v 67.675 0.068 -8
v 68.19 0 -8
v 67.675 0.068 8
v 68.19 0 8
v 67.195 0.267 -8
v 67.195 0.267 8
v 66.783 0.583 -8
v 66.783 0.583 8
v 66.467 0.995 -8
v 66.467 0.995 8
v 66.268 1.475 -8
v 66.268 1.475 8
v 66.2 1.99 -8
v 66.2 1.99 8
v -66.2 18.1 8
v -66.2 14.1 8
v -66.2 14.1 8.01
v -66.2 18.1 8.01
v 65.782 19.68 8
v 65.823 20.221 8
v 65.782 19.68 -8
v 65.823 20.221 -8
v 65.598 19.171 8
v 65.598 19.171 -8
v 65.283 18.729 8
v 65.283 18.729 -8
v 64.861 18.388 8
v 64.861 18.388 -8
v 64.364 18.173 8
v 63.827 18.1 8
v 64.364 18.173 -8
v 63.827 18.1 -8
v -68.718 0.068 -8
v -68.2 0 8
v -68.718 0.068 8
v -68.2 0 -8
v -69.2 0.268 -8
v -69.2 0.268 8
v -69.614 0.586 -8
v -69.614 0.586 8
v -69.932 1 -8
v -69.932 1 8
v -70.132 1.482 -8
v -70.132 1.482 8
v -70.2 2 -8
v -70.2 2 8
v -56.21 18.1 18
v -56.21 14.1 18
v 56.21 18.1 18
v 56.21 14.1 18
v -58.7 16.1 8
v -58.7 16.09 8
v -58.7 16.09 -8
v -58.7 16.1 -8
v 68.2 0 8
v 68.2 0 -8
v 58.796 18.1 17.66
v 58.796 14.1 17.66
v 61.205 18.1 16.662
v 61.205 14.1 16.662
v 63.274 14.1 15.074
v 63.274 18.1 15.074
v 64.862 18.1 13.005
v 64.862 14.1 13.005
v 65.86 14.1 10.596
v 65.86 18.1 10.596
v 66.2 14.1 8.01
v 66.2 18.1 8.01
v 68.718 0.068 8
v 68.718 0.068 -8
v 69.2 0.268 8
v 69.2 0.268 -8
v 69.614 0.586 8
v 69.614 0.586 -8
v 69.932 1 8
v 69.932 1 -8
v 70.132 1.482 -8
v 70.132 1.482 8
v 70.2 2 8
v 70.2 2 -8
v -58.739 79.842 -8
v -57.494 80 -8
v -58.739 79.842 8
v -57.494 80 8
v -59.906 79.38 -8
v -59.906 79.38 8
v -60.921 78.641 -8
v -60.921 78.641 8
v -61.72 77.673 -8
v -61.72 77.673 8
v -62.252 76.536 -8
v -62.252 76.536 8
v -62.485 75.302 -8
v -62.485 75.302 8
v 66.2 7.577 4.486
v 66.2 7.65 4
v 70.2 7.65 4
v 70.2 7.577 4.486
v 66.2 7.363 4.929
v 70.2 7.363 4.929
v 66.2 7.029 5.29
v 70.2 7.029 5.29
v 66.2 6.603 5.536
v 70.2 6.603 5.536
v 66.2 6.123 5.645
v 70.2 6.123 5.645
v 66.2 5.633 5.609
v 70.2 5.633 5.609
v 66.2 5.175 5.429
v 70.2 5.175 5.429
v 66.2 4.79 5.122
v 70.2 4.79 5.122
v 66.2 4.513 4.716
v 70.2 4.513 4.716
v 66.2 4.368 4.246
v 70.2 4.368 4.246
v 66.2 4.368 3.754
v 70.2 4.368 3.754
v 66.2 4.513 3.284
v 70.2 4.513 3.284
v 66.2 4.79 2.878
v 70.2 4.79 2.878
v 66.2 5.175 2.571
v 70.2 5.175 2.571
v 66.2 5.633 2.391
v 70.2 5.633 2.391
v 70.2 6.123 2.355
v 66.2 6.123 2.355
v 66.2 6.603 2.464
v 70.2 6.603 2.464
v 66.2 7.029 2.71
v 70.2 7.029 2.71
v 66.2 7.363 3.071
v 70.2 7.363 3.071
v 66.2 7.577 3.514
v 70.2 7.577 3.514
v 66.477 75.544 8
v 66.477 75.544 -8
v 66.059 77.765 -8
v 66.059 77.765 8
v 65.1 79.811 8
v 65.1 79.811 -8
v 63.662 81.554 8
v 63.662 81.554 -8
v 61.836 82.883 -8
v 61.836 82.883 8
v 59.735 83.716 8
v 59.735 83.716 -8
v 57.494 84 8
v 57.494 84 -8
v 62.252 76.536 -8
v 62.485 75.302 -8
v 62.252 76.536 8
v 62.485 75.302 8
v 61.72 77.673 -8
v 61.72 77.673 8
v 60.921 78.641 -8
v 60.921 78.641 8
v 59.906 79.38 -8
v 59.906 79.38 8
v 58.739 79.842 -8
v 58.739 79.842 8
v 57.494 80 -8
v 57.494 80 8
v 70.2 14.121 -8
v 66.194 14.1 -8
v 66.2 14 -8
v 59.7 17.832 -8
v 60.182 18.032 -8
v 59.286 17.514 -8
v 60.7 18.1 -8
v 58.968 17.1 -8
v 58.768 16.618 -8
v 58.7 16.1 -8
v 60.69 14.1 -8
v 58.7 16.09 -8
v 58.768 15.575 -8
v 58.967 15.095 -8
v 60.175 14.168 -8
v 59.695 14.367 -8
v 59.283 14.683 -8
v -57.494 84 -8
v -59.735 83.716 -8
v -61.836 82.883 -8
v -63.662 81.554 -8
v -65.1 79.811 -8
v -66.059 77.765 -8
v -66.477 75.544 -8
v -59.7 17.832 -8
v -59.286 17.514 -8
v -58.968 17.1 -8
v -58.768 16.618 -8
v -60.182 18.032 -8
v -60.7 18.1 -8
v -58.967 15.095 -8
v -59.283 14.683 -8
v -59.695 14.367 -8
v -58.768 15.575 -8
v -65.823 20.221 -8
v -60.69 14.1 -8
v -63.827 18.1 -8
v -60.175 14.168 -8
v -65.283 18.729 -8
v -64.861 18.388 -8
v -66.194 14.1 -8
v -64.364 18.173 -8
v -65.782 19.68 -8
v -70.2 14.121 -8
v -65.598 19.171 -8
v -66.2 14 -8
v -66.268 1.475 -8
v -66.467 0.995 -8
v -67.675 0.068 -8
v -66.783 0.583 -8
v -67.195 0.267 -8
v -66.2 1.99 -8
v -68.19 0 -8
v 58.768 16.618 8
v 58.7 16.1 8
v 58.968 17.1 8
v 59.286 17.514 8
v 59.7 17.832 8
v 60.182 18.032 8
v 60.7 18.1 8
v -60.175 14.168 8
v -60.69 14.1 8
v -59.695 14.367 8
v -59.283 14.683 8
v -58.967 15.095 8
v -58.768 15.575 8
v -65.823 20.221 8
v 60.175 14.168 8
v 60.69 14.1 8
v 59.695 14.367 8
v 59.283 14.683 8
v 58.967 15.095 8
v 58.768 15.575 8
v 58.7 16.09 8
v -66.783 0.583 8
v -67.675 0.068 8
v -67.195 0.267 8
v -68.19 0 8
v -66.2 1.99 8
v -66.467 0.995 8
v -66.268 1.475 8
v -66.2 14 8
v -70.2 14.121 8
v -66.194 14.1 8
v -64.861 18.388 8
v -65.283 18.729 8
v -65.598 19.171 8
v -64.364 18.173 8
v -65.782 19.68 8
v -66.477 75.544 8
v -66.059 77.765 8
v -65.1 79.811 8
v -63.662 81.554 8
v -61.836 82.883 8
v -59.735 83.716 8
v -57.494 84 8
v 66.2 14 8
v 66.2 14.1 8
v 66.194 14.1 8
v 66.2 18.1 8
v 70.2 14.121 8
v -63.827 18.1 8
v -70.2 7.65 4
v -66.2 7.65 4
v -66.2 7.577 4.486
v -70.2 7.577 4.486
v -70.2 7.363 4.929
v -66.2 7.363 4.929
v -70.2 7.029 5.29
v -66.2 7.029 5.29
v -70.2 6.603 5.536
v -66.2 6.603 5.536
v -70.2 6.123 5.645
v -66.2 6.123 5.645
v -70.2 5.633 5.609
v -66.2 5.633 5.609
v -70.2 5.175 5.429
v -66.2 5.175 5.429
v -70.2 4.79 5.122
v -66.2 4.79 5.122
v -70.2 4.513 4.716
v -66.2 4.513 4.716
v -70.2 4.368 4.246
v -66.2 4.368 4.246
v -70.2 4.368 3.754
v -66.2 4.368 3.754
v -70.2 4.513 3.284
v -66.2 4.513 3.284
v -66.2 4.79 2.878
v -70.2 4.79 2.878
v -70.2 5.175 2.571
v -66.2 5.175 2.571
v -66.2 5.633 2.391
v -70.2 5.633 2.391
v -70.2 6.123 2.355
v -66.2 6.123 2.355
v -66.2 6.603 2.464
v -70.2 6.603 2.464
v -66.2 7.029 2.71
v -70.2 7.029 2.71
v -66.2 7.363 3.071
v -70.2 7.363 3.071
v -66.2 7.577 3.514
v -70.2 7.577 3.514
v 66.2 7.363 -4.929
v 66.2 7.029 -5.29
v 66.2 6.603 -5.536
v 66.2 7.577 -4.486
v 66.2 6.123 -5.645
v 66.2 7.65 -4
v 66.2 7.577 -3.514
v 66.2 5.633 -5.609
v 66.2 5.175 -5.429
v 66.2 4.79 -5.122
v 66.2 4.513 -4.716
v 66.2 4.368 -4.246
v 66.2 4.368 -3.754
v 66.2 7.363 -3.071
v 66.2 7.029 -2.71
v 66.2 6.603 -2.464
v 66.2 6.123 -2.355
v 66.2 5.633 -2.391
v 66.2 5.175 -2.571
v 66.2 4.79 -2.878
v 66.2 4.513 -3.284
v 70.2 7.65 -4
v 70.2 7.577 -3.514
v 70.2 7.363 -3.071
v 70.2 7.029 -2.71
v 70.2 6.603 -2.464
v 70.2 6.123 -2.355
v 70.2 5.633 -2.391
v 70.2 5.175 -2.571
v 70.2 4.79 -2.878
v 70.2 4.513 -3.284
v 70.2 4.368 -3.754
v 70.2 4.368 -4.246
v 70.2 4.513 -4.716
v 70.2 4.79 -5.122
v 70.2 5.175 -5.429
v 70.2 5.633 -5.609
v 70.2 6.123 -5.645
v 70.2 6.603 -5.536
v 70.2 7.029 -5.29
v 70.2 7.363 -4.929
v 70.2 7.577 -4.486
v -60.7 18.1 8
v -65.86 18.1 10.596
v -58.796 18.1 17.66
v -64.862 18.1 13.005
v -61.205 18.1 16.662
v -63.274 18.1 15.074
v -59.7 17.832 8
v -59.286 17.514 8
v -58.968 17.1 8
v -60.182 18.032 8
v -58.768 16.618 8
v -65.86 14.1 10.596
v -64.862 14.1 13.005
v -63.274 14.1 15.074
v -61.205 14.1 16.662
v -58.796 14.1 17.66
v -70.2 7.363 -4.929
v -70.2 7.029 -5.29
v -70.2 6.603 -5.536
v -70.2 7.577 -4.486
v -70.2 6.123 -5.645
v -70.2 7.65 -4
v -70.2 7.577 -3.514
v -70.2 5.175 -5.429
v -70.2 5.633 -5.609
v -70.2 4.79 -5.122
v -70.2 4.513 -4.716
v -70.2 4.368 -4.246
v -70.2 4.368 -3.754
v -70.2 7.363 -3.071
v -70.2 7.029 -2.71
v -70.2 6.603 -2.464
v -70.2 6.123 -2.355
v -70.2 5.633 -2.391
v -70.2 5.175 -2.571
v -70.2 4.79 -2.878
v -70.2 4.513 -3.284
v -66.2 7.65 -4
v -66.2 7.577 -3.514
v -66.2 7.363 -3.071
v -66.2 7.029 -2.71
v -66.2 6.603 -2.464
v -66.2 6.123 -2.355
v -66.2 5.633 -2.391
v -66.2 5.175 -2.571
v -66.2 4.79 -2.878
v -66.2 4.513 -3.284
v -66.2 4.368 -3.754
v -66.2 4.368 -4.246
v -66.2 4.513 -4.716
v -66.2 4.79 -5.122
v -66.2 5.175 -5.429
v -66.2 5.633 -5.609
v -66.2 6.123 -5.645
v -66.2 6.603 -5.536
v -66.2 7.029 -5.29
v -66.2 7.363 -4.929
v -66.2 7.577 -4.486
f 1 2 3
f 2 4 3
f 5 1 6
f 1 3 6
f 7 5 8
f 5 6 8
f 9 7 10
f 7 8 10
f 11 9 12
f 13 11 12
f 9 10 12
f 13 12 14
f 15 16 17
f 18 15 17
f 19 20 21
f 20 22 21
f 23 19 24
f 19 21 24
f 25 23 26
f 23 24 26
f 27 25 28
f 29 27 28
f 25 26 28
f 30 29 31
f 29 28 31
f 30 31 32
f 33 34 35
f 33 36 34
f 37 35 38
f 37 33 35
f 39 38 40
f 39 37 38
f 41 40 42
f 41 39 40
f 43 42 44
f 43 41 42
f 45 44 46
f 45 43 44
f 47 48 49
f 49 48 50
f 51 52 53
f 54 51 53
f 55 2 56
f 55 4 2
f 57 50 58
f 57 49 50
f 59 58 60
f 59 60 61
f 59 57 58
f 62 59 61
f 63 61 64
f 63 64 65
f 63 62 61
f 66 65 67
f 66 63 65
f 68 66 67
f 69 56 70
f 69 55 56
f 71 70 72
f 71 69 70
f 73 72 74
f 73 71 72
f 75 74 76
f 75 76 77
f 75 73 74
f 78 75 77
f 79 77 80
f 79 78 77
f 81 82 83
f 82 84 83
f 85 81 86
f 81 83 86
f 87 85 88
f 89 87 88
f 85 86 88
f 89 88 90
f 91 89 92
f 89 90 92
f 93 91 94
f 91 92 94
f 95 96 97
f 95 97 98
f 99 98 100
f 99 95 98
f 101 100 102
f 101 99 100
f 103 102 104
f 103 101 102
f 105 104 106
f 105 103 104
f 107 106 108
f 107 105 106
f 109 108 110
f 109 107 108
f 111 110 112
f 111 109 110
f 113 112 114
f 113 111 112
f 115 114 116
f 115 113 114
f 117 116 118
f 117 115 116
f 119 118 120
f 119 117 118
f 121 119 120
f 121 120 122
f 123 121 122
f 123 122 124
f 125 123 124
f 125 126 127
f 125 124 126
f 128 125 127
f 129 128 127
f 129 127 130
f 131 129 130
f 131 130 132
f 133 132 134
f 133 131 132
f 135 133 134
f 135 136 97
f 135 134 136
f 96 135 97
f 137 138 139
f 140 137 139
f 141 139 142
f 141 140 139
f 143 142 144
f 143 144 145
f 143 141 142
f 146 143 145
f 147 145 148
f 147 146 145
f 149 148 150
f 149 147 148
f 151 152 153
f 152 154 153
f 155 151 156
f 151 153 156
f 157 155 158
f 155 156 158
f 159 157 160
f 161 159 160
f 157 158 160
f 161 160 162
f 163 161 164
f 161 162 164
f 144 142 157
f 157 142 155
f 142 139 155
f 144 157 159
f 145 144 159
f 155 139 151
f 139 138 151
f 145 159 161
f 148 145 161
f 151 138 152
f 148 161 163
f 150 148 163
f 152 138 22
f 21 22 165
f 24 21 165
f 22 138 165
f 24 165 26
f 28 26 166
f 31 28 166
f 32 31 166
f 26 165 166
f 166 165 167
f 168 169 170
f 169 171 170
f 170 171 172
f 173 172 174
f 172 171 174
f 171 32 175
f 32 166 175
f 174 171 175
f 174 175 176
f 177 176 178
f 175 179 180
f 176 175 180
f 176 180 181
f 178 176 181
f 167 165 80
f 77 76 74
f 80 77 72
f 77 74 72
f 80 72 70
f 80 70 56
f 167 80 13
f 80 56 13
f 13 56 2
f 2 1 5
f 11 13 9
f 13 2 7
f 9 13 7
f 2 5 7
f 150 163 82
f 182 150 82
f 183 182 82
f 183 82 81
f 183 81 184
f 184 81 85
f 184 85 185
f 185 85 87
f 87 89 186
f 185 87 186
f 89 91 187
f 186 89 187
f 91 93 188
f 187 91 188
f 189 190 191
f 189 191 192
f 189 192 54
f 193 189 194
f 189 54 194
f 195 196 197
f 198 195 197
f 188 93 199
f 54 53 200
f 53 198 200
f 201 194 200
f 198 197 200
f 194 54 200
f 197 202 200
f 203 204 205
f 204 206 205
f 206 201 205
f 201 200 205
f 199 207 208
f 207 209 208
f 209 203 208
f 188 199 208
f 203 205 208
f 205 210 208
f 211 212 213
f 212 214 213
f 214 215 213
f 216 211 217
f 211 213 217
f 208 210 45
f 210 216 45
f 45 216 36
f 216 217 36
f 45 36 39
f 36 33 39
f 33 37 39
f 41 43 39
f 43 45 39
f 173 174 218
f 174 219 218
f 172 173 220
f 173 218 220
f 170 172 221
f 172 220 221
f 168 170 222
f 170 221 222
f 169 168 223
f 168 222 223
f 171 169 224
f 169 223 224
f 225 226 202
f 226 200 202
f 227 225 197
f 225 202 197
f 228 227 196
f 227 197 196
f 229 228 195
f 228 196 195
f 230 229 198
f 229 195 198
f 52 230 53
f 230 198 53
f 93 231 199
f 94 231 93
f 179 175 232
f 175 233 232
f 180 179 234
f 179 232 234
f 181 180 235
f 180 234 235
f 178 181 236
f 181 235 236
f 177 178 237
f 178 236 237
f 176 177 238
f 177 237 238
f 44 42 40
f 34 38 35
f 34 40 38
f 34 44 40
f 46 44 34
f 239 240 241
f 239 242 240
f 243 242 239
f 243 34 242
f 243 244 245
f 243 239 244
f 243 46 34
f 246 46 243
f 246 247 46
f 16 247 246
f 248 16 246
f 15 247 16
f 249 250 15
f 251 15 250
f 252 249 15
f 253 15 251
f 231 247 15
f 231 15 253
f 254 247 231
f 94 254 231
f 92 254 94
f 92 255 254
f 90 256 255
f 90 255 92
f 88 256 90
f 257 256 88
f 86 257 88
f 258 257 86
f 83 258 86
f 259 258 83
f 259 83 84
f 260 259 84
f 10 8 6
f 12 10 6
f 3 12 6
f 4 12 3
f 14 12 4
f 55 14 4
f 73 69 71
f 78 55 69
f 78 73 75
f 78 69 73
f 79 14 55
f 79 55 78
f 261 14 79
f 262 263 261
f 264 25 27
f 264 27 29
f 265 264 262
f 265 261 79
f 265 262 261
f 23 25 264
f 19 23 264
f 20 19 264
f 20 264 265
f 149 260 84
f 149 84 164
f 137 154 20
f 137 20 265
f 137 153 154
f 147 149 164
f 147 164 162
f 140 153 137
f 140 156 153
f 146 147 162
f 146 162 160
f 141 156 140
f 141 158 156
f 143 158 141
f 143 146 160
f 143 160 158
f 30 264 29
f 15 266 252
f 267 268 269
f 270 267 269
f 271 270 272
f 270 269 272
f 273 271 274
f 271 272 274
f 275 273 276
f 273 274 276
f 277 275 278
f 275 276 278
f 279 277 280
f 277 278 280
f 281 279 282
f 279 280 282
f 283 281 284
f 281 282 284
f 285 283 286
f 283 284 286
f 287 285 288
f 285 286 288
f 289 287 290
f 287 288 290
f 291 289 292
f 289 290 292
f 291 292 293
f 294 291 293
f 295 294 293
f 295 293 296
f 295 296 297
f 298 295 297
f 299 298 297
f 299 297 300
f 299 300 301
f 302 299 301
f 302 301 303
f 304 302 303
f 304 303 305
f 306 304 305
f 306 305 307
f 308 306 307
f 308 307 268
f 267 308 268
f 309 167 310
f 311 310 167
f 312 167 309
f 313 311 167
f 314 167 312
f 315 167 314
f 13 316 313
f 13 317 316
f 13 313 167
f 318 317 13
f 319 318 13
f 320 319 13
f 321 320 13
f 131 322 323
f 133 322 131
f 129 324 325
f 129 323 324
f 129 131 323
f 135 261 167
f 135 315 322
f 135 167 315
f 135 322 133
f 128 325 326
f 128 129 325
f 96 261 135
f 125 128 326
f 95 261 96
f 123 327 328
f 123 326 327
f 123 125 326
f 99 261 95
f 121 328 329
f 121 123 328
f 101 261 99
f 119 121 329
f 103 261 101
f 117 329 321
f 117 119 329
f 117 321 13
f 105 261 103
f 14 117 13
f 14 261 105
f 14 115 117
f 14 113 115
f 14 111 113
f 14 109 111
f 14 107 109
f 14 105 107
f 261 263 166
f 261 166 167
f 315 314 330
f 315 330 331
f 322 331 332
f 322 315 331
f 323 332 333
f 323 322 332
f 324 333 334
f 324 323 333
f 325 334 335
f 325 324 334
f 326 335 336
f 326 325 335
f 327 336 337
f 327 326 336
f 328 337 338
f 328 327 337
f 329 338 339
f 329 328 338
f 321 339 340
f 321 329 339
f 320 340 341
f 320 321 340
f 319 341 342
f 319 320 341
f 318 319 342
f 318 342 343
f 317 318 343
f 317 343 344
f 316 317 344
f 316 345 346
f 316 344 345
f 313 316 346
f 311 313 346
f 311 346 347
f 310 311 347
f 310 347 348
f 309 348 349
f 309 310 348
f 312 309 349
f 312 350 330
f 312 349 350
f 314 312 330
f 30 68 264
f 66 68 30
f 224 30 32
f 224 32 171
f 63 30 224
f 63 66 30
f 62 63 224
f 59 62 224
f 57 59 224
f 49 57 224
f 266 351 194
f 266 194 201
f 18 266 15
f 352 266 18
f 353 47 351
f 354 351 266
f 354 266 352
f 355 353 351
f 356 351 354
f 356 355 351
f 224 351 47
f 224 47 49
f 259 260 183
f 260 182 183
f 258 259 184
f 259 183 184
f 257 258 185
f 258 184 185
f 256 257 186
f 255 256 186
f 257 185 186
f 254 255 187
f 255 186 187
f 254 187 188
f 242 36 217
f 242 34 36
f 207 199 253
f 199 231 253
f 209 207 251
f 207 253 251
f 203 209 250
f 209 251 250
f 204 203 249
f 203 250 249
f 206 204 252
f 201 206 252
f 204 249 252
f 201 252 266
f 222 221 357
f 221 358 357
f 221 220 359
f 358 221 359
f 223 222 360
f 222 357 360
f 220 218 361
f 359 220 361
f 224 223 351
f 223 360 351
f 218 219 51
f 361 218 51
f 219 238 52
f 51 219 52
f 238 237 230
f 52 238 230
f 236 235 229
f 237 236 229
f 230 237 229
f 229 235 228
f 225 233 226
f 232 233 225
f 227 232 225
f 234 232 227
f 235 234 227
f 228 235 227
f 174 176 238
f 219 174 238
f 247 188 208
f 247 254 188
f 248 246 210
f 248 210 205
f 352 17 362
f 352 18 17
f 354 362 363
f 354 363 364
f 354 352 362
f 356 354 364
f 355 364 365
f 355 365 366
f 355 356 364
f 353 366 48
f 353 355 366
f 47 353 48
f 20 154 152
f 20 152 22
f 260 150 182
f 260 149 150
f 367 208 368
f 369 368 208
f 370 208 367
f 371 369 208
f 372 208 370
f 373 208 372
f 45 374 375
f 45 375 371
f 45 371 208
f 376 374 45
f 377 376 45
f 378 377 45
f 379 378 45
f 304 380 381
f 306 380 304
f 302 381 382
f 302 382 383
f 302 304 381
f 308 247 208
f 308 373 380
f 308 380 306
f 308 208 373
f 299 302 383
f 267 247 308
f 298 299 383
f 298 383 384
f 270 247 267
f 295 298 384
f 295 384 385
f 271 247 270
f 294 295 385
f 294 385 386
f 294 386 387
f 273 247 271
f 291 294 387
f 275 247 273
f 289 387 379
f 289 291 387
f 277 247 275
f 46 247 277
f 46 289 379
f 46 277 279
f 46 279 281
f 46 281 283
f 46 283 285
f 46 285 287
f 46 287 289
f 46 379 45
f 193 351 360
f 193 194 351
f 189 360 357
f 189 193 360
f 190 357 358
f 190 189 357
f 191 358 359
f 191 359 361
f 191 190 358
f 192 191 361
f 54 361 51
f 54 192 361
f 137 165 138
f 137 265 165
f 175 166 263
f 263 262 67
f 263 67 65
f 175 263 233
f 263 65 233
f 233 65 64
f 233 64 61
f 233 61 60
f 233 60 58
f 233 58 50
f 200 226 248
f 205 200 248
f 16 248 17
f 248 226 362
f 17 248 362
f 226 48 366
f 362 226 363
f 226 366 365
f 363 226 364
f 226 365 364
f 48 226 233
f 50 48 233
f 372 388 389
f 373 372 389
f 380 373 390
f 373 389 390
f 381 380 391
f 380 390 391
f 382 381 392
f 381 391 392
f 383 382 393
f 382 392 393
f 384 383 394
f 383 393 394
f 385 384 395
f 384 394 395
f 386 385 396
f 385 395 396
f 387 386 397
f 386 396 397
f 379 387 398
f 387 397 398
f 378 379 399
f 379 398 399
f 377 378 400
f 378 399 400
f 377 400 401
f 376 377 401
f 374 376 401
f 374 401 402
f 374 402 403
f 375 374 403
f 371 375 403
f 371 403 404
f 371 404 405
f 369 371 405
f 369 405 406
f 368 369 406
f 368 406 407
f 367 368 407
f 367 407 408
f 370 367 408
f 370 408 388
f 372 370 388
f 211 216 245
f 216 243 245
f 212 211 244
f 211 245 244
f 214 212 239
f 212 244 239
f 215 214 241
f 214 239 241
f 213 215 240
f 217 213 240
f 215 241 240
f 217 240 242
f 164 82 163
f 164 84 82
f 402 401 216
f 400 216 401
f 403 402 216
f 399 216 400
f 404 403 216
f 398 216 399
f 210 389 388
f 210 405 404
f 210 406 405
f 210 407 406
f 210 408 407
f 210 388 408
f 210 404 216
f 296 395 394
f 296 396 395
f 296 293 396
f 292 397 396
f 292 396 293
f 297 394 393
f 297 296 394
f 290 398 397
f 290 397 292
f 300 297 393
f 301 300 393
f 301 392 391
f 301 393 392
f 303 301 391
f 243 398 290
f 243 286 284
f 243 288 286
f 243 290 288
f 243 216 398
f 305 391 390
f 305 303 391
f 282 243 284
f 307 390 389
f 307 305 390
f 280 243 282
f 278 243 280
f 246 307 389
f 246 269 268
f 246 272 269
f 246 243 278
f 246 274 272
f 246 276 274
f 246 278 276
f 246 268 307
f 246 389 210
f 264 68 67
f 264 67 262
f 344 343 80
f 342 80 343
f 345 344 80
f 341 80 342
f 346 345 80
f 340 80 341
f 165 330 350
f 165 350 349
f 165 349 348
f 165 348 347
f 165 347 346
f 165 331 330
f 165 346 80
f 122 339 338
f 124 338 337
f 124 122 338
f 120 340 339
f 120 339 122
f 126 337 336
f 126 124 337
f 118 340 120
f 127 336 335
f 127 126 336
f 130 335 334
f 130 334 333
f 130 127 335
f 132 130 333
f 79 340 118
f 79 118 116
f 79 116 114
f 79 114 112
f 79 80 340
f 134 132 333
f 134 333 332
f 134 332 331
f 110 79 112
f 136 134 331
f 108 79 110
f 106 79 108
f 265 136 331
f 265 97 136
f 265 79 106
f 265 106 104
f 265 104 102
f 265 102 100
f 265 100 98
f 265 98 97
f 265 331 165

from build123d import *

# Parameters (mm, degrees)
PAD_DEPTH         = 8
SKETCH001_R       = 1.65
POCKET_DEPTH      = 70.201
POCKET_DEPTH_BACK = -70.201
FILLET001_R       = 9
FILLET002_R       = 5
FILLET003_R       = 2
FILLET004_R       = 1.99
PAD001_DEPTH      = 4
FILLET005_R       = 1.99
FILLET006_R       = 2
FILLET007_R       = 9.99


with BuildPart() as part:
    # Sketch → Pad (new body, symmetric)
    with BuildSketch(Plane.XY):
        Polygon((-70.2, 0), (-66.2, 0), (-66.2, 14), (-62.2, 80), (62.2, 80), (66.2, 14), (66.2, 0), (70.2, 0), (70.2, 14.121101), (65.964915, 84), (-65.964915, 84), (-70.2, 14.121101), align=None)
    extrude(amount=PAD_DEPTH, both=True)

    # Sketch001 → Pocket (cut, two sides)
    with BuildSketch(Plane.YZ) as pocket_sk:
        with Locations((6, 4)):
            Circle(SKETCH001_R)
        with Locations((6, -4)):
            Circle(SKETCH001_R)
    extrude(amount=-POCKET_DEPTH, mode=Mode.SUBTRACT)
    extrude(pocket_sk.sketch, amount=-POCKET_DEPTH_BACK, mode=Mode.SUBTRACT)

    # Fillet001
    fillet001_edges = [part.edges().sort_by_distance(p)[0] for p in [
        (-65.964915, 84, 0),
        (65.964915, 84, 0),
    ]]
    fillet(fillet001_edges, radius=FILLET001_R)

    # Fillet002
    fillet002_edges = [part.edges().sort_by_distance(p)[0] for p in [
        (62.2, 80, 0),
        (-62.2, 80, 0),
    ]]
    fillet(fillet002_edges, radius=FILLET002_R)

    # Fillet003
    fillet003_edges = [part.edges().sort_by_distance(p)[0] for p in [
        (-70.2, 0, 0),
        (70.2, 0, 0),
    ]]
    fillet(fillet003_edges, radius=FILLET003_R)

    # Fillet004
    fillet004_edges = [part.edges().sort_by_distance(p)[0] for p in [
        (-66.2, 0, 0),
        (66.2, 0, 0),
    ]]
    fillet(fillet004_edges, radius=FILLET004_R)

    # Sketch002 (on DatumPlane) → Pad001 (join)
    with BuildSketch(Plane.XZ.offset(-14.1)):
        Polygon((-58.7, -8), (-66.2, -8), (-66.2, 18), (66.2, 18), (66.2, -8), (58.7, -8), (58.7, 8), (-58.7, 8), align=None)
    extrude(amount=-PAD001_DEPTH)

    # Fillet005
    fillet005_edges = [part.edges().sort_by_distance(p)[0] for p in [
        (-58.7, 14.1, 0),
        (58.7, 14.1, 0),
    ]]
    fillet(fillet005_edges, radius=FILLET005_R)

    # Fillet006
    fillet006_edges = [part.edges().sort_by_distance(p)[0] for p in [
        (-65.951515, 18.1, 0),
        (-58.7, 18.1, 0),
        (58.7, 18.1, 0),
        (65.951515, 18.1, 0),
    ]]
    fillet(fillet006_edges, radius=FILLET006_R)

    # Fillet007
    fillet007_edges = [part.edges().sort_by_distance(p)[0] for p in [
        (66.2, 16.1, 18),
        (-66.2, 16.1, 18),
    ]]
    fillet(fillet007_edges, radius=FILLET007_R)


solid = part.part
